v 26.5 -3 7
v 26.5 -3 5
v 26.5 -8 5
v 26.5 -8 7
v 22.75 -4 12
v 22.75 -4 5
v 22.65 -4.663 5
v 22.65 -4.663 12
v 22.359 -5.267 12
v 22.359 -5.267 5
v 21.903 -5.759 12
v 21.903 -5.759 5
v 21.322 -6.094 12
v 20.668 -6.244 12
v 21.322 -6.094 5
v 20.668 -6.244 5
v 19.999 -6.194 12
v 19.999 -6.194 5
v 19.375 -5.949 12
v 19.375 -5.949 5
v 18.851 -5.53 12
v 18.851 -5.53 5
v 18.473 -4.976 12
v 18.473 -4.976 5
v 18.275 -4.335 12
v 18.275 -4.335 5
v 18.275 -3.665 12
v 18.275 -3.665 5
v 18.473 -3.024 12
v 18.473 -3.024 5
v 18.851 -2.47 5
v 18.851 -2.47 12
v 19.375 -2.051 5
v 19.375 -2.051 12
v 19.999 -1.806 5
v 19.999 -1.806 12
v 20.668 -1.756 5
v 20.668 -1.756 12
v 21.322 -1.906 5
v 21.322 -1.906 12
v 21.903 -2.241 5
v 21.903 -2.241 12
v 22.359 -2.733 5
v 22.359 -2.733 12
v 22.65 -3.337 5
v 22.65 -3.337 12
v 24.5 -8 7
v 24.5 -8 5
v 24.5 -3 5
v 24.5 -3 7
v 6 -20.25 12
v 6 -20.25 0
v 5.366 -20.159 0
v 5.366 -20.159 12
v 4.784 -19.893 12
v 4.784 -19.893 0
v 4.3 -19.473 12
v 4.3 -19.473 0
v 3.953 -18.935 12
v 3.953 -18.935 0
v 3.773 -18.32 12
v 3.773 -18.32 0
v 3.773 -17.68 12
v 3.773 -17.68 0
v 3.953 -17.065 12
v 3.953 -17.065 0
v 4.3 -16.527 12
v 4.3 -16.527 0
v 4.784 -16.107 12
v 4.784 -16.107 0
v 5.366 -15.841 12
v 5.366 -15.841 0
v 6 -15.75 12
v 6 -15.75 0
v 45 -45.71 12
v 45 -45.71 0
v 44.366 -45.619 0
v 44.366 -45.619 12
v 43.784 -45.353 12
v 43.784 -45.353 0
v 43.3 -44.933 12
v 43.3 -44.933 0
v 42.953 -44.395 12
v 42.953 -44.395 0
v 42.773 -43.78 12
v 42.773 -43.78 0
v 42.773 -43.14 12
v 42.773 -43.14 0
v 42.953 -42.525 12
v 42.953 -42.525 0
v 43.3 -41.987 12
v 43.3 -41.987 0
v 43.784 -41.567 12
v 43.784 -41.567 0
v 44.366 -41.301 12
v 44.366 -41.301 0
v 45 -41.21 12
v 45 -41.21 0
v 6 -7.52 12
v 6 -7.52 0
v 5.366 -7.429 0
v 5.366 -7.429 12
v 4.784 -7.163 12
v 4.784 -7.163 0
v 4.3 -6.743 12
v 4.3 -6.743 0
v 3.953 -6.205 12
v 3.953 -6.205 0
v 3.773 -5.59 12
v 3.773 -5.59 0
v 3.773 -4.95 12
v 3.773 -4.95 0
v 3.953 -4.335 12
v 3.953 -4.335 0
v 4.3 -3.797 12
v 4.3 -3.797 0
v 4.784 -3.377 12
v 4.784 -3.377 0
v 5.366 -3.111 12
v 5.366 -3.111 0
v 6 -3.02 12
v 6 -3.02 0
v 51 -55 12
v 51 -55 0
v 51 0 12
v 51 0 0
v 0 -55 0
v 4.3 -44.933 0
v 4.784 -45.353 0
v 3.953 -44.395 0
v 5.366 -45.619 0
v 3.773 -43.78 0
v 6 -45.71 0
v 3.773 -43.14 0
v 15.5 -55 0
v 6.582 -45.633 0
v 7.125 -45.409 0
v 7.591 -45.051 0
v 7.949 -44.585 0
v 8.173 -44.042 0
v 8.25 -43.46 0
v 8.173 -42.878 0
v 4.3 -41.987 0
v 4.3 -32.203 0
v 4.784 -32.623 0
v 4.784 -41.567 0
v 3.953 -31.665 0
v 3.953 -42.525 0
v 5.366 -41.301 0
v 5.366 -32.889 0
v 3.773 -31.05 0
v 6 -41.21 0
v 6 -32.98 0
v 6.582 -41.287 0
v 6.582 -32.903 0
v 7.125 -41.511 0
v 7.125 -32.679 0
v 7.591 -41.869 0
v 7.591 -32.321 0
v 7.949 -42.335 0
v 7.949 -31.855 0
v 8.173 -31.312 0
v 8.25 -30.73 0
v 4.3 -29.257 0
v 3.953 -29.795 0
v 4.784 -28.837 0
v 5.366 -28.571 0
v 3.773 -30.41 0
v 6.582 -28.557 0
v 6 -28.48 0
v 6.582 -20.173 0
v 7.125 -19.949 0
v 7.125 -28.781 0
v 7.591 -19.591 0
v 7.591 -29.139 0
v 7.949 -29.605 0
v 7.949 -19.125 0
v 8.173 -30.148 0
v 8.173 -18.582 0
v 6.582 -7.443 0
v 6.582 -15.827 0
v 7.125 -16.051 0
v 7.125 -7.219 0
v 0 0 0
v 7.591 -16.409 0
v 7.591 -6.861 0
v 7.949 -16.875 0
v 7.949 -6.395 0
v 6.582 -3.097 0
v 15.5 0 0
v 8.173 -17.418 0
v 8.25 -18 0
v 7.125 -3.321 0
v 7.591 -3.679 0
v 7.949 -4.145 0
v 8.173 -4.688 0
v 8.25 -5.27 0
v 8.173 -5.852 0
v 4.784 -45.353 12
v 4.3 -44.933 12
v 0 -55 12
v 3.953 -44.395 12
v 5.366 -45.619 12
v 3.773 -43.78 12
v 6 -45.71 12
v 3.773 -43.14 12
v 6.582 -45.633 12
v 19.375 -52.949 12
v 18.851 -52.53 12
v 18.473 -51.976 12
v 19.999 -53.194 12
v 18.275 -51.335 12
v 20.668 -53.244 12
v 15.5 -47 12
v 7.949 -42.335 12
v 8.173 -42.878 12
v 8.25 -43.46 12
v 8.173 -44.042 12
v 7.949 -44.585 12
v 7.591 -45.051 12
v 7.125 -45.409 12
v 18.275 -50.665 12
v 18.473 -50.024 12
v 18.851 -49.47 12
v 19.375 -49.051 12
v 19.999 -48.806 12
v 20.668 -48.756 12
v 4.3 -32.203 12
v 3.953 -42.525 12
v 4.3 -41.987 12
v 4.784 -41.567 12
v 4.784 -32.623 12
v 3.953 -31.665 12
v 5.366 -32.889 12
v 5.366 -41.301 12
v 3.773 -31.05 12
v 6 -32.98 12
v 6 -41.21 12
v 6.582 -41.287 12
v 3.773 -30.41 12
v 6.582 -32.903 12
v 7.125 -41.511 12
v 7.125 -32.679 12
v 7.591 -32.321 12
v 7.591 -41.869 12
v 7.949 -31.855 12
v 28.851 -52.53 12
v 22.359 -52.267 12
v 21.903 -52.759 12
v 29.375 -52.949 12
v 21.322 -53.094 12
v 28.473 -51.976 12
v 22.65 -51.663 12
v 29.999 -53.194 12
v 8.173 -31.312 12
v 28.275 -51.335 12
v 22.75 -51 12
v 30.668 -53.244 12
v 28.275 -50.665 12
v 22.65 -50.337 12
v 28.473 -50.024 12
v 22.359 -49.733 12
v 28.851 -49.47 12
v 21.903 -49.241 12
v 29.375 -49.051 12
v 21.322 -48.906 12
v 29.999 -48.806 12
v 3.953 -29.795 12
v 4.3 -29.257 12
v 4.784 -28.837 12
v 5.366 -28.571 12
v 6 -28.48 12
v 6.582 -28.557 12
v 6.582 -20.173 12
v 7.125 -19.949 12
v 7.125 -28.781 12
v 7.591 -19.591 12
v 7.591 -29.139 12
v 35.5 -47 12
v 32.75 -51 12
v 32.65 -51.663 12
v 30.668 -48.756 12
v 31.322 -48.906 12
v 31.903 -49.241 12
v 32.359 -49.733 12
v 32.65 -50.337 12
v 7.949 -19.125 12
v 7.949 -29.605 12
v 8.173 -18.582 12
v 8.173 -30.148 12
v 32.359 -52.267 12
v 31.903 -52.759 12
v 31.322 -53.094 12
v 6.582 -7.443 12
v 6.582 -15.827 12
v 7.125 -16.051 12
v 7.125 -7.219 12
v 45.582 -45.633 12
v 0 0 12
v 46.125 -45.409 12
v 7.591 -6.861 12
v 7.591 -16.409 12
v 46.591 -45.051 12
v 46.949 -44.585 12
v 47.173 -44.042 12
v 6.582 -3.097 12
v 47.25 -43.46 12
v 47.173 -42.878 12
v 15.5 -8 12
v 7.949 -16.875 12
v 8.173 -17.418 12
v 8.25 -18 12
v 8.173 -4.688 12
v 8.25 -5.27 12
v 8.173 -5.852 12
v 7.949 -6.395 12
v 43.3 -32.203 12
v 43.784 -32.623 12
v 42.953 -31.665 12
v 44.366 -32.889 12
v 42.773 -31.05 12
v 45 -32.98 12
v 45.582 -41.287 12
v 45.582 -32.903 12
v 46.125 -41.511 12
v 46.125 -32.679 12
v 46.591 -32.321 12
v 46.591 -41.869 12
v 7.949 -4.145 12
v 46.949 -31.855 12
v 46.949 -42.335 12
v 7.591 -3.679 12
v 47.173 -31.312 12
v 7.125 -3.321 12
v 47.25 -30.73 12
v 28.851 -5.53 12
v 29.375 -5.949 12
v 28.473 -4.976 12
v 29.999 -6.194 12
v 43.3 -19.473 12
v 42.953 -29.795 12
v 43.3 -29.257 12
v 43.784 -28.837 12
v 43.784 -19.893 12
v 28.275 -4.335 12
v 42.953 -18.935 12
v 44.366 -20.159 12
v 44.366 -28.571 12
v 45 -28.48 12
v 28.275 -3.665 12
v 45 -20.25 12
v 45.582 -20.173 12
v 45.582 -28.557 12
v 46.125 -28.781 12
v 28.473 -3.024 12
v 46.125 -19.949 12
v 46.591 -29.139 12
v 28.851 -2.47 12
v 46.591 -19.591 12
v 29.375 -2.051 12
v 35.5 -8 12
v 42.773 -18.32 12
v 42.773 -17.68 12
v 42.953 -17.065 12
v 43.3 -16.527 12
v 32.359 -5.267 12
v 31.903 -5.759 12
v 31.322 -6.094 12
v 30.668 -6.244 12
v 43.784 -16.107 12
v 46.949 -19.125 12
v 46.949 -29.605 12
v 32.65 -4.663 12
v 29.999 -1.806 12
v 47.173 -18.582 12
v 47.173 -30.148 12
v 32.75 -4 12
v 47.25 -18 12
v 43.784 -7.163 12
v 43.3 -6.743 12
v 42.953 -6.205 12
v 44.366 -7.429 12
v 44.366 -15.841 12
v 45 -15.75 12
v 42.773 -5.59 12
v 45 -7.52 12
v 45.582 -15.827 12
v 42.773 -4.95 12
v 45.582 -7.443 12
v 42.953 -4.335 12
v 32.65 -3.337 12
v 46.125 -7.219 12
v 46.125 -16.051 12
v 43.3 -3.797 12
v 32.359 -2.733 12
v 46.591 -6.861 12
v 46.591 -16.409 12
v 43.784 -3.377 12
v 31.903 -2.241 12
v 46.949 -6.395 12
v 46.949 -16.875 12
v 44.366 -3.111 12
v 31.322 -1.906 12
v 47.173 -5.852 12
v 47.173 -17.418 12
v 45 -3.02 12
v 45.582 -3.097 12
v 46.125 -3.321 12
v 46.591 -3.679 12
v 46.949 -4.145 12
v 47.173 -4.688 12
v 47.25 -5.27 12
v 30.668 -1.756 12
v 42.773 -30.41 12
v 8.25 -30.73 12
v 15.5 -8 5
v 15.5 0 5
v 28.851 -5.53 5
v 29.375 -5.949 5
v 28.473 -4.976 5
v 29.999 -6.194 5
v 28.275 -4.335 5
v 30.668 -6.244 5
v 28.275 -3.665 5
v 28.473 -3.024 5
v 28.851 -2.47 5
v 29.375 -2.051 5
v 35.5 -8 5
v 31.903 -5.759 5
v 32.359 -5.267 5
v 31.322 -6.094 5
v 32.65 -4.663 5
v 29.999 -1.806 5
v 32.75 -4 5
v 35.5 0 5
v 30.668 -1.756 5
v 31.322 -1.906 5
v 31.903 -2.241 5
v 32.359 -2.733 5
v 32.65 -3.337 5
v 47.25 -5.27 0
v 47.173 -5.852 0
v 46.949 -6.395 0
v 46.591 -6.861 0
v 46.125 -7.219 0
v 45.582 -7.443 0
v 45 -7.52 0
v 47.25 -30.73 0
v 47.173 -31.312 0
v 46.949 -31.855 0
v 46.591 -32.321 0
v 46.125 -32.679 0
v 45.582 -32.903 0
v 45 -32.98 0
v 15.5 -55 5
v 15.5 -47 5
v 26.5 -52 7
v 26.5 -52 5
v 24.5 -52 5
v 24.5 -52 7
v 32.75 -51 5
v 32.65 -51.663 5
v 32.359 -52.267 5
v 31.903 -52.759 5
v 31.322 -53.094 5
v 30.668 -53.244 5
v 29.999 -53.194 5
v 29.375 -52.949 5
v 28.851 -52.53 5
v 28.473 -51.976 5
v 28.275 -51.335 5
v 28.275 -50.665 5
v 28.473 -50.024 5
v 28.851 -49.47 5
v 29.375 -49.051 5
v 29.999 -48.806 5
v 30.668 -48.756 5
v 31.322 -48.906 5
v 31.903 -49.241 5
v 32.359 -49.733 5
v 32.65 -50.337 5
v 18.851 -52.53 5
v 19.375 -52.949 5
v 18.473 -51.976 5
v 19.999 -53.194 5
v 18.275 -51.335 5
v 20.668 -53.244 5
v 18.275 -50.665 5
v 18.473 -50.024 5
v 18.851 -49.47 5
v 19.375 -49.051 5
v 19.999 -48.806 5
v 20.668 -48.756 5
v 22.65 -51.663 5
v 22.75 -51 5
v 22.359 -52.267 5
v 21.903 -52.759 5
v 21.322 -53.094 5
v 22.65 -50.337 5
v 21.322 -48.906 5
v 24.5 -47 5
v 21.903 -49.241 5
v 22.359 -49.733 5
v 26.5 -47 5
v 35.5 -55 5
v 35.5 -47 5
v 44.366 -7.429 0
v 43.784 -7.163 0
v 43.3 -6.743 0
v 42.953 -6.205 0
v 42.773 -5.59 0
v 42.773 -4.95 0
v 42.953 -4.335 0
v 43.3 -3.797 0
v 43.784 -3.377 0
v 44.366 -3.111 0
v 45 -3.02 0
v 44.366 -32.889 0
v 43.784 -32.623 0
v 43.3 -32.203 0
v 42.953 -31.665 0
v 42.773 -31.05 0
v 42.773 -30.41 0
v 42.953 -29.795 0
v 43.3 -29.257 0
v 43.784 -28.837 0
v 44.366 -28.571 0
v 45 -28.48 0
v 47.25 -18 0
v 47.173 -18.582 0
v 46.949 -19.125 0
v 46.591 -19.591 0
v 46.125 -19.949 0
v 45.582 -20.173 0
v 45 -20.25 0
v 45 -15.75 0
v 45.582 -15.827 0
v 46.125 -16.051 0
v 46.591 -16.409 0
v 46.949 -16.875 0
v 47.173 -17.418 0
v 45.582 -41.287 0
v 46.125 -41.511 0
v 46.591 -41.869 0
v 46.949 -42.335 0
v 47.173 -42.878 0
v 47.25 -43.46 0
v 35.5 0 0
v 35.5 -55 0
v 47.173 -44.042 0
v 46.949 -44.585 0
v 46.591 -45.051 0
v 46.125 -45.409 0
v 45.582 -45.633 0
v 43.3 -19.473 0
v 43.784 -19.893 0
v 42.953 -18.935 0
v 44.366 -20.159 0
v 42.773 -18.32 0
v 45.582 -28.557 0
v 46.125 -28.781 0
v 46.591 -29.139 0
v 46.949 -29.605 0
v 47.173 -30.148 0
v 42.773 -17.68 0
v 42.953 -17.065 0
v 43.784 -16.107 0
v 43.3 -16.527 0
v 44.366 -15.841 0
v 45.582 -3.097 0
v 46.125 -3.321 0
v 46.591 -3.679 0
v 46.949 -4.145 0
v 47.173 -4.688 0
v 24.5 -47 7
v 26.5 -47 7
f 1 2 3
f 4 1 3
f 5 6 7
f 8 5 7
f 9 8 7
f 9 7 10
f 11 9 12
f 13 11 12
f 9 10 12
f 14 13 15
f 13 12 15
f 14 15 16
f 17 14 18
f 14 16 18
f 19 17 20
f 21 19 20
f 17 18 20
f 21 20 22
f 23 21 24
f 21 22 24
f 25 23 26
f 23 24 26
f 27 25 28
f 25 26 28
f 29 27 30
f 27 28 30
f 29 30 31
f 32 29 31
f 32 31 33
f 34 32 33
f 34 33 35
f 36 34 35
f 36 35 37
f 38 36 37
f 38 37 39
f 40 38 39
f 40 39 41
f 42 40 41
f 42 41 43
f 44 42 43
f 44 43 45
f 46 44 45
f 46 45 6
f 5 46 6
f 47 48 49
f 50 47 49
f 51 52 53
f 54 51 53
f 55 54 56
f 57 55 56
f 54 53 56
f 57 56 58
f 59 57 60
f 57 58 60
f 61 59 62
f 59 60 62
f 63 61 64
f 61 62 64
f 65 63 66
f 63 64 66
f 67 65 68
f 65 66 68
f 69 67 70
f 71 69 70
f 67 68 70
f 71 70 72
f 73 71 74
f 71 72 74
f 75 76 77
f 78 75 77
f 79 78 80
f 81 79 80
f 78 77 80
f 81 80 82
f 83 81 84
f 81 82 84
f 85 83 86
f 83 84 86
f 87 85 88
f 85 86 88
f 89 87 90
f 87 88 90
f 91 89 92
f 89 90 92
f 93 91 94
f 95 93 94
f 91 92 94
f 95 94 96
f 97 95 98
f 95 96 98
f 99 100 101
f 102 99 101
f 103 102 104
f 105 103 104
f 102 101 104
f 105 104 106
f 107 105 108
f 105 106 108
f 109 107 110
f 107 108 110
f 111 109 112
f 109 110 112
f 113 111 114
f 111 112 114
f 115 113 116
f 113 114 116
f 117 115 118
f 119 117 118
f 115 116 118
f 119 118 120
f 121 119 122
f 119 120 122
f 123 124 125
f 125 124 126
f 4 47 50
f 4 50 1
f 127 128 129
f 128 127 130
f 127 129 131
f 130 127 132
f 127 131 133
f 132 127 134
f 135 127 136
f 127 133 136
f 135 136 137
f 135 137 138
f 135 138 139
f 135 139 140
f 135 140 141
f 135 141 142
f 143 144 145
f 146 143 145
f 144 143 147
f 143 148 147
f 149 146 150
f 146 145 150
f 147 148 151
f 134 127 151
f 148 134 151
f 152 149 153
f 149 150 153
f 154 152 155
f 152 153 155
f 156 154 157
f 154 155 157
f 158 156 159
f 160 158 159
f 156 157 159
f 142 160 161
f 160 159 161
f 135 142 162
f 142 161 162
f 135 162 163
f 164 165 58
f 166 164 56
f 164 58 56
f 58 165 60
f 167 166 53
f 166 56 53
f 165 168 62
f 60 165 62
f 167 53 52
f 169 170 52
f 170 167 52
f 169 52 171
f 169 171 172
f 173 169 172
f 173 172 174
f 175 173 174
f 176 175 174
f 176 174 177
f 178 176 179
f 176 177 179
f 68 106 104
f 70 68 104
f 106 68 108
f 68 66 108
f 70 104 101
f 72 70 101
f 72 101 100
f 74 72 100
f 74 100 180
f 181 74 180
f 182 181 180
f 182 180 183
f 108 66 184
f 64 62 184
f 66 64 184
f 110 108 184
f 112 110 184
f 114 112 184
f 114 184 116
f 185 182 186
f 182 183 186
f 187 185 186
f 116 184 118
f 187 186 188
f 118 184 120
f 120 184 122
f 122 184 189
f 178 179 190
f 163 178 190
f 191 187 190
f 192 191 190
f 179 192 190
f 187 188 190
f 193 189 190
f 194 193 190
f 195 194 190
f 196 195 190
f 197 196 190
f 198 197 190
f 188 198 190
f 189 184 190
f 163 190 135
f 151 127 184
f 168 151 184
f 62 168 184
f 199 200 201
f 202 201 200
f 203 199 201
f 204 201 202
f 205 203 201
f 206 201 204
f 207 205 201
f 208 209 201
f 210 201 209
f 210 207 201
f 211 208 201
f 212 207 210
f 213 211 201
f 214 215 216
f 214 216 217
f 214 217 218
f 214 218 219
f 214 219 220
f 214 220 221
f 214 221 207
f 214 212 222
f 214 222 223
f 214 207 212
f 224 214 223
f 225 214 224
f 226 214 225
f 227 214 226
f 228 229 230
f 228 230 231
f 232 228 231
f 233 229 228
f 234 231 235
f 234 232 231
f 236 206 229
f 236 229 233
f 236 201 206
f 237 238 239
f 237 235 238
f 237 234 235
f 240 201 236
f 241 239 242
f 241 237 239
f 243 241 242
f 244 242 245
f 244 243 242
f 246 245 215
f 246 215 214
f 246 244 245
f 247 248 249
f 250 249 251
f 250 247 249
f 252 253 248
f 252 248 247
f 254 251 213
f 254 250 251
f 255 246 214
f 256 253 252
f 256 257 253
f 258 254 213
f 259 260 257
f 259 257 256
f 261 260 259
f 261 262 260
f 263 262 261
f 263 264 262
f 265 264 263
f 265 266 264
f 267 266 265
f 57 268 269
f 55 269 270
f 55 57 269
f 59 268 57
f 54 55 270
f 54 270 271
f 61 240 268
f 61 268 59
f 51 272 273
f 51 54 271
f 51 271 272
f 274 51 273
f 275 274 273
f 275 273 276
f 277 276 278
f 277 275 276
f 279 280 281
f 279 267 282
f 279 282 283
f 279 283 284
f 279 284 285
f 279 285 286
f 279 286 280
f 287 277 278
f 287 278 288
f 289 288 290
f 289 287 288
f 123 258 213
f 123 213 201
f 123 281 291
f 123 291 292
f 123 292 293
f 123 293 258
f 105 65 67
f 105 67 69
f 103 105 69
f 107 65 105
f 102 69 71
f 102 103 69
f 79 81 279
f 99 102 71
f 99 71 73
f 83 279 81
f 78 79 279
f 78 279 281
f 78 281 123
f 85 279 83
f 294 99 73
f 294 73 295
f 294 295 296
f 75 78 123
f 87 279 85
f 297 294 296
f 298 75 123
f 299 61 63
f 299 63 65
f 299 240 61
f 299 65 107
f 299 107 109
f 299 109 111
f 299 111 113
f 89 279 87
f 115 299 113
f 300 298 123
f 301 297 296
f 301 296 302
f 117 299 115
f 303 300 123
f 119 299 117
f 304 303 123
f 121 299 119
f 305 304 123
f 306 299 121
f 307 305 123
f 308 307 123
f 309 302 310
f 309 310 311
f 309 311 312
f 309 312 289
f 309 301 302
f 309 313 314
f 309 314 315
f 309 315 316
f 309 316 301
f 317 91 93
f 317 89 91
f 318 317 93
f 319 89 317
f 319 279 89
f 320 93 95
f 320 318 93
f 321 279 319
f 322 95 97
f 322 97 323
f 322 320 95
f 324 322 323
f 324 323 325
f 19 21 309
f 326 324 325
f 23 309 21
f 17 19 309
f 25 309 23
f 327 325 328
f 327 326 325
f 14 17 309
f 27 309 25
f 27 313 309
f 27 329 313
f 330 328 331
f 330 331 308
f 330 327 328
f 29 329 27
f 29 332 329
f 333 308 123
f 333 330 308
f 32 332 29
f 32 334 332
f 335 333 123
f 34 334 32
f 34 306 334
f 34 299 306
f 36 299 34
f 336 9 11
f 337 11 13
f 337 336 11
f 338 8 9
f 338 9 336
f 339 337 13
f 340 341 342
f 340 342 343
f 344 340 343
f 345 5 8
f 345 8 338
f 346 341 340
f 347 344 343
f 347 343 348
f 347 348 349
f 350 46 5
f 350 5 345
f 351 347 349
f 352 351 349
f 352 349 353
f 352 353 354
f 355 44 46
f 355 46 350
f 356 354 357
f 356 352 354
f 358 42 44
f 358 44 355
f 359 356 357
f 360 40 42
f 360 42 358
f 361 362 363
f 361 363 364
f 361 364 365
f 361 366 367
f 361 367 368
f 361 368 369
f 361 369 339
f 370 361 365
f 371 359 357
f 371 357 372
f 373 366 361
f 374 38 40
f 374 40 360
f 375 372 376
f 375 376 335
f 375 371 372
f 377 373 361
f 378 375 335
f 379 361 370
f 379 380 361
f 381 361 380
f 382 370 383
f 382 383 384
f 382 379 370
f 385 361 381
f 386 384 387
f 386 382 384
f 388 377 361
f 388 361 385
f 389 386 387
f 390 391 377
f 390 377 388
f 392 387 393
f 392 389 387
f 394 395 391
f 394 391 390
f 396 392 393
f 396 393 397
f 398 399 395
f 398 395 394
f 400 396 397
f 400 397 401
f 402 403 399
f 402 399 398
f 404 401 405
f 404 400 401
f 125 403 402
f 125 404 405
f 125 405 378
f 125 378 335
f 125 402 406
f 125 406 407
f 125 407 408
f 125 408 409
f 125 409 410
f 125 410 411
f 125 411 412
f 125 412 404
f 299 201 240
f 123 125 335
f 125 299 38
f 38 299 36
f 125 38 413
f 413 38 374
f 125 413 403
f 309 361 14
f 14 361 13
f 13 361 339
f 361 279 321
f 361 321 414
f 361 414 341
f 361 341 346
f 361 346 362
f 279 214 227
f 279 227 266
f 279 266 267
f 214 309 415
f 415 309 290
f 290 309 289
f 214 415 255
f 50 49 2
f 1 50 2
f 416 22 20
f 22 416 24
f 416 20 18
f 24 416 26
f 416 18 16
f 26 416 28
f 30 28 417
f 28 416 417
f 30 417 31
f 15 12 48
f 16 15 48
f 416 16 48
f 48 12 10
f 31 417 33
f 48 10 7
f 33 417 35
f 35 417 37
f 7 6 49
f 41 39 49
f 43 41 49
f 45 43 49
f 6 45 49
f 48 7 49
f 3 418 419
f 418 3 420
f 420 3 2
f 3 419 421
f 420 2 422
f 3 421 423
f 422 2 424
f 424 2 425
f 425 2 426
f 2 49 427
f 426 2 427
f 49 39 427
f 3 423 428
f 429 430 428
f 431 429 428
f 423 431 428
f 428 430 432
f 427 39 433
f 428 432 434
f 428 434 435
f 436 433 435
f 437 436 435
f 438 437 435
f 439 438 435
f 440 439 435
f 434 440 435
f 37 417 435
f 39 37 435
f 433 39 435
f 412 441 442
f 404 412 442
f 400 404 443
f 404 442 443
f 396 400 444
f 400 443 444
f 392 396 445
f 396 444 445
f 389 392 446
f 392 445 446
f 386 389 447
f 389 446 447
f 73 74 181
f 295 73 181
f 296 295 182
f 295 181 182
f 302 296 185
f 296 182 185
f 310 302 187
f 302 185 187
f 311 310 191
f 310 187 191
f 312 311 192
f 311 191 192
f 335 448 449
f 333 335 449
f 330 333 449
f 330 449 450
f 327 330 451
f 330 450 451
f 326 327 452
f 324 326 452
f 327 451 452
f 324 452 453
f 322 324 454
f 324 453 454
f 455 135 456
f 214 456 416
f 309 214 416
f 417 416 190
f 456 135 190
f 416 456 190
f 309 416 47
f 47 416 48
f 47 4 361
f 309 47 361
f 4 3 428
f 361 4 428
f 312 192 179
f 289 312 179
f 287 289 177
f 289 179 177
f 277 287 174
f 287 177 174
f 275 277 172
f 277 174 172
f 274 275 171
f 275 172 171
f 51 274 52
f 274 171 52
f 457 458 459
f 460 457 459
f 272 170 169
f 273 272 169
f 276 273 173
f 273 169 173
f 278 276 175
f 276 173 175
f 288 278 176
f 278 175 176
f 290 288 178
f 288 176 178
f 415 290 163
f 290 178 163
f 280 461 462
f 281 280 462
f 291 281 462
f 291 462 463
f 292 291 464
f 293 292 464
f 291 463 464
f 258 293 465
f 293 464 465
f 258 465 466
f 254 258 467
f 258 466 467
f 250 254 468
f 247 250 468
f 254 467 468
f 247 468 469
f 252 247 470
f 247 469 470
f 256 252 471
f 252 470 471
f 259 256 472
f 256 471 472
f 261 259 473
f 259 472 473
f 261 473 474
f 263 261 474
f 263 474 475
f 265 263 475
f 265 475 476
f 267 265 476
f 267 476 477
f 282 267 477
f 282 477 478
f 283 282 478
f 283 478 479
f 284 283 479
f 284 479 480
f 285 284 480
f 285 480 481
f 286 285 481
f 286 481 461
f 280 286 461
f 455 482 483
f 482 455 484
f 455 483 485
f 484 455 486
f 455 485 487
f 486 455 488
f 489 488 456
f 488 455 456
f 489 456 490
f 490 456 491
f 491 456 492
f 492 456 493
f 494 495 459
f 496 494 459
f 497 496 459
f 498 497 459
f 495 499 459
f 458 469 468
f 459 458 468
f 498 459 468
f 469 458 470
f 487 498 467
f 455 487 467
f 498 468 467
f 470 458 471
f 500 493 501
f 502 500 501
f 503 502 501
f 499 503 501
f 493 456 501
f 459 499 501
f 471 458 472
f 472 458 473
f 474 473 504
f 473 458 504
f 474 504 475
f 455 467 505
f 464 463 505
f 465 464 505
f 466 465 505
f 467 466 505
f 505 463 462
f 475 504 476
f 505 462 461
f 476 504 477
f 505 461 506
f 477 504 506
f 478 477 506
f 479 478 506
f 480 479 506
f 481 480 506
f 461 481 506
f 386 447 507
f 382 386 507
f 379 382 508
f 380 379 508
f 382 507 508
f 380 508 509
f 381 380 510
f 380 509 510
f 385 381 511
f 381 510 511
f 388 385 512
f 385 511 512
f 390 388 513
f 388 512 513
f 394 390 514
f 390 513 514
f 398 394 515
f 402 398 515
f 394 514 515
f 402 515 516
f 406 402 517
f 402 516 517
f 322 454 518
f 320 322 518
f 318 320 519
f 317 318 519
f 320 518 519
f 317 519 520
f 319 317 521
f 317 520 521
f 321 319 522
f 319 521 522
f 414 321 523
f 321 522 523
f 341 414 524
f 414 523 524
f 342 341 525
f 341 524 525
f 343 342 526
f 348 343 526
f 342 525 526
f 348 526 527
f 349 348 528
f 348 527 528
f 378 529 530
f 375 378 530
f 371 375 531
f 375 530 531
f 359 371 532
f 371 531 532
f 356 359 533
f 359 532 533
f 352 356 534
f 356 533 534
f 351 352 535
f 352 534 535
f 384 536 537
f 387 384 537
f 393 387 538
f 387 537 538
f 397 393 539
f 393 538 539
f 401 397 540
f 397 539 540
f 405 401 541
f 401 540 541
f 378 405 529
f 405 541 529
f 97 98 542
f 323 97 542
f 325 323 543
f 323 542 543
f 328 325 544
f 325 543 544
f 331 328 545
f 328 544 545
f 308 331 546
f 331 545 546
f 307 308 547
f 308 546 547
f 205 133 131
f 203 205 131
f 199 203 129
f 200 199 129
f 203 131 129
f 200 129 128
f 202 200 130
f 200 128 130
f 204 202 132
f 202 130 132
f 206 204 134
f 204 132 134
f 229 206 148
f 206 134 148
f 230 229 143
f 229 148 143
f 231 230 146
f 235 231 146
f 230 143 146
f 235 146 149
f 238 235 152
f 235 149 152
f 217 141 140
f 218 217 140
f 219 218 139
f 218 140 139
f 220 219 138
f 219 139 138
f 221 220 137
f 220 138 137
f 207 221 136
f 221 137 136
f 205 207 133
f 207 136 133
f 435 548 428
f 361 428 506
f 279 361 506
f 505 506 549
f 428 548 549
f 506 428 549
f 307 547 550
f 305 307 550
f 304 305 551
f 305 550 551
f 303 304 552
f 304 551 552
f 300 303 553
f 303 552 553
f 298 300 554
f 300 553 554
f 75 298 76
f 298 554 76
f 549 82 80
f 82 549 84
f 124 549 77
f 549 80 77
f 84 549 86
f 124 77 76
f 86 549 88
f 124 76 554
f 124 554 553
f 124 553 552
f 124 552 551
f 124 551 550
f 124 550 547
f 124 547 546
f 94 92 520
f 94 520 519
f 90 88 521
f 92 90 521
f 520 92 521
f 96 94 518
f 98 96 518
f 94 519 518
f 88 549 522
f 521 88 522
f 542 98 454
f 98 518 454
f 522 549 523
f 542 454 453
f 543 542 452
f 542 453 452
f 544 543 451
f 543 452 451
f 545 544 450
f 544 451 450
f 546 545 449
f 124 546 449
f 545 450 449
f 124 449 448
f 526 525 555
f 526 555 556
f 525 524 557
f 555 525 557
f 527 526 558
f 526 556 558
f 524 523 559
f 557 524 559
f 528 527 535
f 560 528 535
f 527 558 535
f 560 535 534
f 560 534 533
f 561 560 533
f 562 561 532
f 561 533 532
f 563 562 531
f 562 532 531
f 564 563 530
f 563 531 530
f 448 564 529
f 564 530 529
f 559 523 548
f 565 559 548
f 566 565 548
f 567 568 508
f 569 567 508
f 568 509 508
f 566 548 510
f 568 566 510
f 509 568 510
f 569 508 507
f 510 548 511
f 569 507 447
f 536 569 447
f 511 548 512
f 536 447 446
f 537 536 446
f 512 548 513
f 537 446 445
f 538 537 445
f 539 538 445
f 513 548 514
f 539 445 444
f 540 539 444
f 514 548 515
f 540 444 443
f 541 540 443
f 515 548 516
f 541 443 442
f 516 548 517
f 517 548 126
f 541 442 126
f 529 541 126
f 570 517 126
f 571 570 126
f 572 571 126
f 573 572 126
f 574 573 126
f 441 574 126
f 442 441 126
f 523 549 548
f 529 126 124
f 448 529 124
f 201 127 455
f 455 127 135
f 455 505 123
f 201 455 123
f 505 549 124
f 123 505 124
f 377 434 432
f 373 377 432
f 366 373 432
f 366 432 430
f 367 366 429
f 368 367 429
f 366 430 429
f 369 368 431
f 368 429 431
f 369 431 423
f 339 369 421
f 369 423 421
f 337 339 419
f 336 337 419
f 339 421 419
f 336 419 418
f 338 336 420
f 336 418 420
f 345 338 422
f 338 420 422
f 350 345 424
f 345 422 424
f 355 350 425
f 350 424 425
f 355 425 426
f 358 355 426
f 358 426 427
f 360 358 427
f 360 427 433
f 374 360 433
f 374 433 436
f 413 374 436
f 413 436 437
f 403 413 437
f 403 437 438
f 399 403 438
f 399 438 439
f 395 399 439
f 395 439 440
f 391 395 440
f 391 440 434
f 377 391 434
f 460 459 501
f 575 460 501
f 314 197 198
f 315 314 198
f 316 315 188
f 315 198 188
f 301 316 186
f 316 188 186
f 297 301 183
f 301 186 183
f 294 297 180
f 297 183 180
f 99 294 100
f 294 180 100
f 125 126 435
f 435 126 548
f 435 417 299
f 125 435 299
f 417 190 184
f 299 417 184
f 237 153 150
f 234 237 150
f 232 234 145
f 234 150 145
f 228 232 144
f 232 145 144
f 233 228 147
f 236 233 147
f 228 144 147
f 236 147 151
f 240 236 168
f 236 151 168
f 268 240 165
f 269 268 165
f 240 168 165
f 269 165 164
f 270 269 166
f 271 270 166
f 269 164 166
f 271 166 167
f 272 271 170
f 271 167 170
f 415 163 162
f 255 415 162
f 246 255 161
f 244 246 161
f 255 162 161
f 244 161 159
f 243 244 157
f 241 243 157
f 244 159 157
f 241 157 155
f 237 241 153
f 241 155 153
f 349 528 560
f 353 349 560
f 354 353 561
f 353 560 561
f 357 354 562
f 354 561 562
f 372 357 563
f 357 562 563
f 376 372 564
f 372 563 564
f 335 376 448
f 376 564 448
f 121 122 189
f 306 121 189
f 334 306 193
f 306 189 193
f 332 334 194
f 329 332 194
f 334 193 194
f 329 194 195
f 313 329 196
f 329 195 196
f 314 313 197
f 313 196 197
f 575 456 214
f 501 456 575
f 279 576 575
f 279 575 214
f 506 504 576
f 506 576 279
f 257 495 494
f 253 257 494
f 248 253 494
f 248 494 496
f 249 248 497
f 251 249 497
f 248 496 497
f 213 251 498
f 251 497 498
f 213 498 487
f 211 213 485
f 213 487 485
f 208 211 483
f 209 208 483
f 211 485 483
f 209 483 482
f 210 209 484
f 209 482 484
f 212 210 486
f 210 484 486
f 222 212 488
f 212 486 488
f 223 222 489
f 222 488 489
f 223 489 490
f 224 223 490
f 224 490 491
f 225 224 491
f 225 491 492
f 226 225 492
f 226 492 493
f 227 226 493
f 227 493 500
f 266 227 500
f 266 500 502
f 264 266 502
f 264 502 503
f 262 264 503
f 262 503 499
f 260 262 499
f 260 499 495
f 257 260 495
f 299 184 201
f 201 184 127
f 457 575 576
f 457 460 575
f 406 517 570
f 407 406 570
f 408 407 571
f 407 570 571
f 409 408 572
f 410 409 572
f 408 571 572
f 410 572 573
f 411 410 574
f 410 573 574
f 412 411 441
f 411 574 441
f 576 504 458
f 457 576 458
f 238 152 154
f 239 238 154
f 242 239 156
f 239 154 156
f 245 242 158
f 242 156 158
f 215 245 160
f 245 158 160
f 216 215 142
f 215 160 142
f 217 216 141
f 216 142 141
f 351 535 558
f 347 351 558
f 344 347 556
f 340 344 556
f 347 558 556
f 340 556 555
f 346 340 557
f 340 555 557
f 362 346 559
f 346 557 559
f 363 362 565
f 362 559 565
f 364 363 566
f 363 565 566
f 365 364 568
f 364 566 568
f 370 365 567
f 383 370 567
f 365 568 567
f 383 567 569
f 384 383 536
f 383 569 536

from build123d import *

# Parameters (mm, degrees)
F0_W     = 20
F0_H     = 8
F1_DEPTH = 12
F2_DEPTH = 5
F3_DEPTH = 5
F5_DEPTH = 2
F4_R     = 2.25
F6_DEPTH = 25
F8_DEPTH = 2
F7_R     = 2.25
F9_DEPTH = 25


with BuildPart() as f1:
    # F0 (on Top) → F1 (new body)
    with BuildSketch(Plane.XY):
        with Locations((25.5, -4)):
            Rectangle(F0_W, F0_H)
        with Locations((25.5, -51)):
            Rectangle(F0_W, F0_H)
        with BuildLine():
            Line((6, 0), (0, 0))
            Line((0, 0), (0, -55))
            Line((0, -55), (6, -55))
            Line((6, -55), (6, -45.71))
            ThreePointArc((6, -45.71), (3.75, -43.46), (6, -41.21))
            Line((6, -41.21), (6, -32.98))
            ThreePointArc((6, -32.98), (3.75, -30.73), (6, -28.48))
            Line((6, -28.48), (6, -20.25))
            ThreePointArc((6, -20.25), (3.75, -18), (6, -15.75))
            Line((6, -15.75), (6, -7.52))
            ThreePointArc((6, -7.52), (3.75, -5.27), (6, -3.02))
            Line((6, -3.02), (6, 0))
        make_face()
        with BuildLine():
            Line((51, 0), (45, 0))
            Line((45, 0), (45, -3.02))
            ThreePointArc((45, -3.02), (46.5909902577, -3.6790097423), (47.25, -5.27))
            ThreePointArc((47.25, -5.27), (46.5909902577, -6.8609902577), (45, -7.52))
            Line((45, -7.52), (45, -15.75))
            ThreePointArc((45, -15.75), (46.5909902577, -16.4090097423), (47.25, -18))
            ThreePointArc((47.25, -18), (46.5909902577, -19.5909902577), (45, -20.25))
            Line((45, -20.25), (45, -28.48))
            ThreePointArc((45, -28.48), (46.5909902577, -29.1390097423), (47.25, -30.73))
            ThreePointArc((47.25, -30.73), (46.5909902577, -32.3209902577), (45, -32.98))
            Line((45, -32.98), (45, -41.21))
            ThreePointArc((45, -41.21), (46.5909902577, -41.8690097423), (47.25, -43.46))
            ThreePointArc((47.25, -43.46), (46.5909902577, -45.0509902577), (45, -45.71))
            Line((45, -45.71), (45, -55))
            Line((45, -55), (51, -55))
            Line((51, -55), (51, 0))
        make_face()
        with BuildLine():
            Line((15.5, 0), (6, 0))
            Line((6, 0), (6, -3.02))
            ThreePointArc((6, -3.02), (7.5909902577, -3.6790097423), (8.25, -5.27))
            ThreePointArc((8.25, -5.27), (7.5909902577, -6.8609902577), (6, -7.52))
            Line((6, -7.52), (6, -15.75))
            ThreePointArc((6, -15.75), (7.5909902577, -16.4090097423), (8.25, -18))
            ThreePointArc((8.25, -18), (7.5909902577, -19.5909902577), (6, -20.25))
            Line((6, -20.25), (6, -28.48))
            ThreePointArc((6, -28.48), (7.5909902577, -29.1390097423), (8.25, -30.73))
            ThreePointArc((8.25, -30.73), (7.5909902577, -32.3209902577), (6, -32.98))
            Line((6, -32.98), (6, -41.21))
            ThreePointArc((6, -41.21), (7.5909902577, -41.8690097423), (8.25, -43.46))
            ThreePointArc((8.25, -43.46), (7.5909902577, -45.0509902577), (6, -45.71))
            Line((6, -45.71), (6, -55))
            Line((6, -55), (15.5, -55))
            Line((15.5, -55), (15.5, -47))
            Line((15.5, -47), (15.5, -8))
            Line((15.5, -8), (15.5, 0))
        make_face()
        with BuildLine():
            Line((45, 0), (35.5, 0))
            Line((35.5, 0), (35.5, -8))
            Line((35.5, -8), (35.5, -47))
            Line((35.5, -47), (35.5, -55))
            Line((35.5, -55), (45, -55))
            Line((45, -55), (45, -45.71))
            ThreePointArc((45, -45.71), (42.75, -43.46), (45, -41.21))
            Line((45, -41.21), (45, -32.98))
            ThreePointArc((45, -32.98), (42.75, -30.73), (45, -28.48))
            Line((45, -28.48), (45, -20.25))
            ThreePointArc((45, -20.25), (42.75, -18), (45, -15.75))
            Line((45, -15.75), (45, -7.52))
            ThreePointArc((45, -7.52), (42.75, -5.27), (45, -3.02))
            Line((45, -3.02), (45, 0))
        make_face()
    extrude(amount=F1_DEPTH)

    # F0 (on Top) → F2 (cut)
    with BuildSketch(Plane.XY):
        with Locations((25.5, -51)):
            Rectangle(F0_W, F0_H)
    extrude(amount=F2_DEPTH, mode=Mode.SUBTRACT)

    # F0 (on Top) → F3 (cut)
    with BuildSketch(Plane.XY):
        with Locations((25.5, -4)):
            Rectangle(F0_W, F0_H)
    extrude(amount=F3_DEPTH, mode=Mode.SUBTRACT)

    # F4 (on face) → F5 (cut)
    with BuildSketch(Plane(origin=(0, 0, 5), x_dir=(1, 0, 0), z_dir=(0, 0, -1))):
        Polygon((24.5, 47), (25.5, 47), (26.5, 47), (26.5, 52), (24.5, 52), align=None)
    extrude(amount=-F5_DEPTH, mode=Mode.SUBTRACT)

    # F4 (on face) → F6 (cut)
    with BuildSketch(Plane(origin=(0, 0, 5), x_dir=(1, 0, 0), z_dir=(0, 0, -1))):
        with Locations((20.5, 51)):
            Circle(F4_R)
        with Locations((30.5, 51)):
            Circle(F4_R)
    extrude(amount=-F6_DEPTH, mode=Mode.SUBTRACT)

    # F7 (on face) → F8 (cut)
    with BuildSketch(Plane(origin=(0, 0, 5), x_dir=(1, 0, 0), z_dir=(0, 0, -1))):
        Polygon((26.5, 8), (25.5, 8), (24.5, 8), (24.5, 3), (26.5, 3), align=None)
    extrude(amount=-F8_DEPTH, mode=Mode.SUBTRACT)

    # F7 (on face) → F9 (cut)
    with BuildSketch(Plane(origin=(0, 0, 5), x_dir=(1, 0, 0), z_dir=(0, 0, -1))):
        with Locations((30.5, 4)):
            Circle(F7_R)
        with Locations((20.5, 4)):
            Circle(F7_R)
    extrude(amount=-F9_DEPTH, mode=Mode.SUBTRACT)


solid = f1.part
